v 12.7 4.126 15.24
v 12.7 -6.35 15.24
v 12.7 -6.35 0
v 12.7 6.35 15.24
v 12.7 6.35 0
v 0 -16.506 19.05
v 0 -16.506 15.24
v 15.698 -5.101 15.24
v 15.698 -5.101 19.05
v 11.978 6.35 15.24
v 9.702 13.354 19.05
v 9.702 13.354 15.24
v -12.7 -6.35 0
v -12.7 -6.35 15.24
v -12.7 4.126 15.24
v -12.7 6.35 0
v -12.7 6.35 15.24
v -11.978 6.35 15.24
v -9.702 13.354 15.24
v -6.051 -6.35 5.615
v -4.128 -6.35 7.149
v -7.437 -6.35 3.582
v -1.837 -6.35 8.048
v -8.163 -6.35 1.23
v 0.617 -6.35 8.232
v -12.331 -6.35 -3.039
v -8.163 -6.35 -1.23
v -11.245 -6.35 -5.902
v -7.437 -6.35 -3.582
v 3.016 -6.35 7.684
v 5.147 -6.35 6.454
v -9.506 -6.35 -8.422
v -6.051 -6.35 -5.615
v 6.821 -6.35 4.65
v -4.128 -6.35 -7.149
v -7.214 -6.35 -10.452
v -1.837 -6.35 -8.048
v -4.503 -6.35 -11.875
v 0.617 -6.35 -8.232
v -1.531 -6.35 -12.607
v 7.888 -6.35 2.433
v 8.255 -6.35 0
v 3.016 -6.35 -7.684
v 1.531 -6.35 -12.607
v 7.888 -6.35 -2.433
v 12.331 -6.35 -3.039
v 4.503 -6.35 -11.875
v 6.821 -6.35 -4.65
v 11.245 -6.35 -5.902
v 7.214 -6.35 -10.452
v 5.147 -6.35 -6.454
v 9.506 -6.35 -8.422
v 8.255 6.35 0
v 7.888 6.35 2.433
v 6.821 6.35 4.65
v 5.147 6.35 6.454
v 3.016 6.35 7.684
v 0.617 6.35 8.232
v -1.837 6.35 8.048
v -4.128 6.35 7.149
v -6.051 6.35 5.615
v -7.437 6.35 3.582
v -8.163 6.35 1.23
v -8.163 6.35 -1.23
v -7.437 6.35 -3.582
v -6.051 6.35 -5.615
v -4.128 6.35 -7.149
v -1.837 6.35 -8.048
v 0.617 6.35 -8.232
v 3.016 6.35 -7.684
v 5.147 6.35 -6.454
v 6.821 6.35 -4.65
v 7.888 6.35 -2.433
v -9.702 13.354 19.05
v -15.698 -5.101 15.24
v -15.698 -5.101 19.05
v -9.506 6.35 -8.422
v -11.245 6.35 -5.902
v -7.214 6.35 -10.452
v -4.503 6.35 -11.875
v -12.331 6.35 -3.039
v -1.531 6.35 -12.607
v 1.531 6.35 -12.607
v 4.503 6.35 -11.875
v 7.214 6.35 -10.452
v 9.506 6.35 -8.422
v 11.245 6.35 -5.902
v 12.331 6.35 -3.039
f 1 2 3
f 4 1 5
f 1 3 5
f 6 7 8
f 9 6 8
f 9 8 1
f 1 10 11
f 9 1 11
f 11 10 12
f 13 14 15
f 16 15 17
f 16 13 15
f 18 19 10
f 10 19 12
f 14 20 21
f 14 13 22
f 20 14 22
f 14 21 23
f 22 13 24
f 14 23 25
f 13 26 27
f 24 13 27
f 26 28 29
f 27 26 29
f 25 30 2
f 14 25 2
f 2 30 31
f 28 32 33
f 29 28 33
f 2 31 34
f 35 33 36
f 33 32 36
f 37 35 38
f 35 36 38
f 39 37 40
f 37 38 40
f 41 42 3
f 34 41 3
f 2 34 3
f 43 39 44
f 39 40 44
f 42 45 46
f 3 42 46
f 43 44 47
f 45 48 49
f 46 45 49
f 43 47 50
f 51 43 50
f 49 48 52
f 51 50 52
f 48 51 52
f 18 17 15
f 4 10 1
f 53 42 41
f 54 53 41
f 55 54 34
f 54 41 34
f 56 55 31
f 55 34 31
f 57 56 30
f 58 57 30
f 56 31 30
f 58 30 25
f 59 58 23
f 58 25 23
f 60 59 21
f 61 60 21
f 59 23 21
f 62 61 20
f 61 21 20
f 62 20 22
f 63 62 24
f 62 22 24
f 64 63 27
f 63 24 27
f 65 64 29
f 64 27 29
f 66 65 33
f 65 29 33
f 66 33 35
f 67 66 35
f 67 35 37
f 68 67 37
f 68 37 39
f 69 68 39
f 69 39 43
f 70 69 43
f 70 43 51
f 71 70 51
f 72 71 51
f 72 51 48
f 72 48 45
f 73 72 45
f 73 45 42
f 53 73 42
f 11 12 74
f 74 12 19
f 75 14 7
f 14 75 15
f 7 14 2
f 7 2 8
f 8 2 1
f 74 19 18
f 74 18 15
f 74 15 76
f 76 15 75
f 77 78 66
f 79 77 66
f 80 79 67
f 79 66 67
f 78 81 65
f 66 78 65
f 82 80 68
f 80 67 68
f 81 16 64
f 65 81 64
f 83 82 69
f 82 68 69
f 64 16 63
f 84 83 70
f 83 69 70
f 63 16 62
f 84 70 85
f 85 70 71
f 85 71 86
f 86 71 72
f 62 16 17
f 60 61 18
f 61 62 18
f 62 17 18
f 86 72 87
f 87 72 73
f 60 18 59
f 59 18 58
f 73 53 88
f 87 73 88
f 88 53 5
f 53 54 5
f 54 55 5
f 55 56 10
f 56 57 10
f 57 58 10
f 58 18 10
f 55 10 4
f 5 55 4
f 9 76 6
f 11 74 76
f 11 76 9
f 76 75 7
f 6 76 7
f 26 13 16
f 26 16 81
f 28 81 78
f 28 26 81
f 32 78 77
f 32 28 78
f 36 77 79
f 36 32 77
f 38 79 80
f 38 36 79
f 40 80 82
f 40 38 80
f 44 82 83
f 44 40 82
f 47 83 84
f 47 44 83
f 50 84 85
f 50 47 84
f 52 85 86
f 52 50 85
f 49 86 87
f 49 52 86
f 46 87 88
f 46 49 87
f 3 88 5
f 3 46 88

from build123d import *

# Parameters (mm, degrees)
F0_W     = 25.4
F0_H     = 12.7
F1_DEPTH = 15.24
F2_R     = 12.7
F3_DEPTH = 12.7
F4_R     = 8.255
F5_DEPTH = 25.4
F7_DEPTH = 3.81


with BuildPart() as f1:
    # F0 (on Top) → F1 (new body)
    with BuildSketch(Plane.XY):
        Rectangle(F0_W, F0_H)
    extrude(amount=F1_DEPTH)

    # F2 (on face) → F3 (join)
    with BuildSketch(Plane.XZ.offset(6.35)):
        Circle(F2_R)
    extrude(amount=-F3_DEPTH)

    # F4 (on face) → F5 (cut)
    with BuildSketch(Plane.XZ.offset(6.35)):
        Circle(F4_R)
    extrude(amount=-F5_DEPTH, mode=Mode.SUBTRACT)

    # F6 (on face) → F7 (join)
    with BuildSketch(Plane.XY.offset(15.24)):
        Polygon((15.698063, -5.10061), (9.701937, 13.35357), (-9.701937, 13.35357), (-15.698063, -5.10061), (0, -16.505921), align=None)
    extrude(amount=F7_DEPTH)


solid = f1.part
